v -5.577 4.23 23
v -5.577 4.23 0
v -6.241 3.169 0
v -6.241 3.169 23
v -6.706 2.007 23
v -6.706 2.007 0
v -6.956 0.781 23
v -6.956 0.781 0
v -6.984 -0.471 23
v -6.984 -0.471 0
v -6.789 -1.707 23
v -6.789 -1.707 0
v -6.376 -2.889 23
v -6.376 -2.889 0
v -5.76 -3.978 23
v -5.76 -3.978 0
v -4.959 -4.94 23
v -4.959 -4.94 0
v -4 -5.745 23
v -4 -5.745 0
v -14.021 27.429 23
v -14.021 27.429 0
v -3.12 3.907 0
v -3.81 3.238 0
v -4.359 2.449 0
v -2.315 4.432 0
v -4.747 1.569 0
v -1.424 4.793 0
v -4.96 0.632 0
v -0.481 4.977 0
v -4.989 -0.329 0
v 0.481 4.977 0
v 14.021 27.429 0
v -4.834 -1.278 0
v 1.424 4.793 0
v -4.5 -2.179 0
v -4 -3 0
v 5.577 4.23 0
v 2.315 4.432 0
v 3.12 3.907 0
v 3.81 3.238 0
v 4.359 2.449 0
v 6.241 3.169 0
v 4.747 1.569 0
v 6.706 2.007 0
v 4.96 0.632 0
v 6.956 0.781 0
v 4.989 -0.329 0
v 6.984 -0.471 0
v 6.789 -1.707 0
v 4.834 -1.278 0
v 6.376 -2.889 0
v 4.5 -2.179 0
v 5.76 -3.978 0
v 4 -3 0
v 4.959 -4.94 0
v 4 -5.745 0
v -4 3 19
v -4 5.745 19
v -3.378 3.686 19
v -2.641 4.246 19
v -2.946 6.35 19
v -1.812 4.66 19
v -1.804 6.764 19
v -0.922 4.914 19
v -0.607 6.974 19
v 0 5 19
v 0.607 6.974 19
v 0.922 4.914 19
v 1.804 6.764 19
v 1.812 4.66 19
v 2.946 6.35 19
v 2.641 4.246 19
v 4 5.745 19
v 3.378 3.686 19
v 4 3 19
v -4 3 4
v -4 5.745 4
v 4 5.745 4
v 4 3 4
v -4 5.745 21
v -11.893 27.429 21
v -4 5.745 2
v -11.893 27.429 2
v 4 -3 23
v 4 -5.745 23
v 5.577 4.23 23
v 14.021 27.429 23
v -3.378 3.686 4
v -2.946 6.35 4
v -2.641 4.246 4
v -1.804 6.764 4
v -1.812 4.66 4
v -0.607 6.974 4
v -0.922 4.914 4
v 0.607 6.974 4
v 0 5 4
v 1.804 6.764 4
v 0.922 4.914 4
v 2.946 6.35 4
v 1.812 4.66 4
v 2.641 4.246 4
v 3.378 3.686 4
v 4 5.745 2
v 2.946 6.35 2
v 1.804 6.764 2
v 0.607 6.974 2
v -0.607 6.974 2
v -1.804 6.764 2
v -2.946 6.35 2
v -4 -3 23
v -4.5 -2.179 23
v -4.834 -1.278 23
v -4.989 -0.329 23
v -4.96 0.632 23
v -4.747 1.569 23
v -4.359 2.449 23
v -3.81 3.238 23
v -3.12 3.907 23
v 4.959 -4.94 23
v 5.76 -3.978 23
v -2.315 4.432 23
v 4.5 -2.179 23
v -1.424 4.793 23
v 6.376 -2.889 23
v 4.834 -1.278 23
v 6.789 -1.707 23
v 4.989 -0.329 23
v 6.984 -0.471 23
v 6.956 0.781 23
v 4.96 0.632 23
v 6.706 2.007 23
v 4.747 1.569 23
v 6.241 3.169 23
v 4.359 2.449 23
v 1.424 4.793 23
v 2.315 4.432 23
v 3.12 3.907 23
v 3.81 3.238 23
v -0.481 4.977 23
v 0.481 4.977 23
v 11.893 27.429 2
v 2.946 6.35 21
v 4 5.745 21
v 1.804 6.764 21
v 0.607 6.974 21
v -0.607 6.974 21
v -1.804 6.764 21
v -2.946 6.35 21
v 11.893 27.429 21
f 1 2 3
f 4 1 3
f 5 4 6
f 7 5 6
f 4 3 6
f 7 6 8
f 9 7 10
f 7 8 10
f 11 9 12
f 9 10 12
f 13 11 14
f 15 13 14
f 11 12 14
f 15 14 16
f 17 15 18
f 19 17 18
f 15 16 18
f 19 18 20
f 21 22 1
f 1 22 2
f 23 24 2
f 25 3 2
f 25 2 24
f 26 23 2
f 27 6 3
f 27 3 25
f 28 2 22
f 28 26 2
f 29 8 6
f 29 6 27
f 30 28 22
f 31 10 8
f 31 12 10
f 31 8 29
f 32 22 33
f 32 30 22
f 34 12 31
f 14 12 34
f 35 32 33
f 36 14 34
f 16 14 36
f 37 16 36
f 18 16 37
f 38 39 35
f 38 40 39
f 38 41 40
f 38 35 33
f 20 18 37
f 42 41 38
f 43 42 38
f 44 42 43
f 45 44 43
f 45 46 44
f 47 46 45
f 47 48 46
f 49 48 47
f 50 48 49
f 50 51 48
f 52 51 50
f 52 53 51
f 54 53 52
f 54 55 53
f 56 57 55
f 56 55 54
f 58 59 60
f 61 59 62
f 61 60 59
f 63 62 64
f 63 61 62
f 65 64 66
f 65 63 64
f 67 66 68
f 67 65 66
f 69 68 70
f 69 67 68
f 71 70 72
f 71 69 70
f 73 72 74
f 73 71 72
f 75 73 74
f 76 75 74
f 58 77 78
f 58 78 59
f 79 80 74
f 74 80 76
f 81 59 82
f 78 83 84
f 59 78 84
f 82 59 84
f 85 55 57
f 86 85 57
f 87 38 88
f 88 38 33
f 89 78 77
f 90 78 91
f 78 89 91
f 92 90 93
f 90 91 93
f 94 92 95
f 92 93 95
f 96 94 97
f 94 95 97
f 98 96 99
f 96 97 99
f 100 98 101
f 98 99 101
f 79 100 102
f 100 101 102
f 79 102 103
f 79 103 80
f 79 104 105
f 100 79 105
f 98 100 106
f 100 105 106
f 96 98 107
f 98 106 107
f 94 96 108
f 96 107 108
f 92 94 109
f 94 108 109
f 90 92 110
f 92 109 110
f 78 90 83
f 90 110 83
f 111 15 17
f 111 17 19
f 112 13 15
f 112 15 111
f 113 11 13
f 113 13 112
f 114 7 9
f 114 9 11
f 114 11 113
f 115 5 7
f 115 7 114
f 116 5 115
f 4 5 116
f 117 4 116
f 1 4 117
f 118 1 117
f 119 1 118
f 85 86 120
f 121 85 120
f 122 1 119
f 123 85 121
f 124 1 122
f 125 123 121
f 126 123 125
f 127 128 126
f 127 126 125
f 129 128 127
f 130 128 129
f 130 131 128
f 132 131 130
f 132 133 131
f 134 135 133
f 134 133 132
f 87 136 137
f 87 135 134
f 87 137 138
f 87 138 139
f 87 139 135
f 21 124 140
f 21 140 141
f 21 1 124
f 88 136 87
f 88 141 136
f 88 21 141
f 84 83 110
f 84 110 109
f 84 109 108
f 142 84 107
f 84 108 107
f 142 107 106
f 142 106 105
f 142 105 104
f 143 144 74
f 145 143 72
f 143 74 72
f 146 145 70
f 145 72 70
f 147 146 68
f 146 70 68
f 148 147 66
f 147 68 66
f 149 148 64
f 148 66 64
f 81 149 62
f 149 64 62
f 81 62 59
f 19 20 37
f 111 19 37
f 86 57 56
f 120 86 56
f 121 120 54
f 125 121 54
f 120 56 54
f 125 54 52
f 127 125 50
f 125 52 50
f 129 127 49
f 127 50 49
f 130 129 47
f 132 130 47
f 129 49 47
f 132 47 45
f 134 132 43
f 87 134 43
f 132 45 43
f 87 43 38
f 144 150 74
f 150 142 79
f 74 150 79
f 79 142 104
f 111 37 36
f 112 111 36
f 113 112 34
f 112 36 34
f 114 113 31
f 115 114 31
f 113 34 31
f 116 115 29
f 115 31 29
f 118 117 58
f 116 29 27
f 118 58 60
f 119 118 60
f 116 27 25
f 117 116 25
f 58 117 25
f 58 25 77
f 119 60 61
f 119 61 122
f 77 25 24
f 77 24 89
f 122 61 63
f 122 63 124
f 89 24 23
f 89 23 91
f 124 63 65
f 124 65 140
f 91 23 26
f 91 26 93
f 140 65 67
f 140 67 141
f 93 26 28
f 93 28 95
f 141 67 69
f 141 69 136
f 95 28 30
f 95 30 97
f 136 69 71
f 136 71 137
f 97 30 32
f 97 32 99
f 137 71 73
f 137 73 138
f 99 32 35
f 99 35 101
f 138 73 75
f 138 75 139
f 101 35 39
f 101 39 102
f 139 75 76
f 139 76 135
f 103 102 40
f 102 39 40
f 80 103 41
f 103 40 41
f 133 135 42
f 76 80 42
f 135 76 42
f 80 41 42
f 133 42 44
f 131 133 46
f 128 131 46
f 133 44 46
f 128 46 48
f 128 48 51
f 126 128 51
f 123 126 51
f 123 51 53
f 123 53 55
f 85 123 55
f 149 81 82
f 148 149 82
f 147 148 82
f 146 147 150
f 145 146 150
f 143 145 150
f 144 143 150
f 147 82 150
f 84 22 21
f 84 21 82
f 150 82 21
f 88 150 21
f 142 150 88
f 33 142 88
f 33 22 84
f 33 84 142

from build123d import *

# Parameters (mm, degrees)
F1_DEPTH = 23
F3_DEPTH = 2
F5_DEPTH = 2
F6_W     = 8
F6_H     = 15
F7_DEPTH = 25


with BuildPart() as f1:
    # F0 (on Top) → F1 (new body)
    with BuildSketch(Plane.XY):
        with BuildLine():
            Line((-14.0209387689, 27.4292568356), (-5.5771887097, 4.2302442124))
            ThreePointArc((-5.5771887097, 4.2302442124), (-4.8480847739, 5.0493637247), (-4, 5.7445626465))
            Line((-4, 5.7445626465), (-11.892583224, 27.4292568356))
            Line((-11.892583224, 27.4292568356), (-14.0209387689, 27.4292568356))
        make_face()
        with BuildLine():
            ThreePointArc((-4, -3), (0, 5), (4, -3))
            Line((4, -3), (4, -5.7445626465))
            ThreePointArc((4, -5.7445626465), (6.9141036197, -1.0932388287), (5.5771887097, 4.2302442124))
            ThreePointArc((5.5771887097, 4.2302442124), (4.8480847739, 5.0493637247), (4, 5.7445626465))
            ThreePointArc((4, 5.7445626465), (0, 7), (-4, 5.7445626465))
            ThreePointArc((-4, 5.7445626465), (-4.8480847739, 5.0493637247), (-5.5771887097, 4.2302442124))
            ThreePointArc((-5.5771887097, 4.2302442124), (-6.9141036197, -1.0932388287), (-4, -5.7445626465))
            Line((-4, -5.7445626465), (-4, -3))
        make_face()
        with BuildLine():
            ThreePointArc((4, 5.7445626465), (4.8480847739, 5.0493637247), (5.5771887097, 4.2302442124))
            Line((5.5771887097, 4.2302442124), (14.0209387689, 27.4292568356))
            Line((14.0209387689, 27.4292568356), (11.892583224, 27.4292568356))
            Line((11.892583224, 27.4292568356), (4, 5.7445626465))
        make_face()
    extrude(amount=F1_DEPTH)

    # F2 (on face) → F3 (join)
    with BuildSketch(Plane.XY.offset(23)):
        with BuildLine():
            Line((11.892583224, 27.4292568356), (-11.892583224, 27.4292568356))
            Line((-11.892583224, 27.4292568356), (-4, 5.7445626465))
            ThreePointArc((-4, 5.7445626465), (0, 7), (4, 5.7445626465))
            Line((4, 5.7445626465), (11.892583224, 27.4292568356))
        make_face()
    extrude(amount=-F3_DEPTH)

    # F4 (on face) → F5 (join)
    with BuildSketch(Plane(origin=(0, 0, 0), x_dir=(1, 0, 0), z_dir=(0, 0, -1))):
        with BuildLine():
            Line((-11.892583224, -27.4292568356), (11.892583224, -27.4292568356))
            Line((11.892583224, -27.4292568356), (4, -5.7445626465))
            ThreePointArc((4, -5.7445626465), (0, -7), (-4, -5.7445626465))
            Line((-4, -5.7445626465), (-11.892583224, -27.4292568356))
        make_face()
    extrude(amount=-F5_DEPTH)

    # F6 (on Front) → F7 (cut)
    with BuildSketch(Plane.XZ):
        with Locations((0, 11.5)):
            Rectangle(F6_W, F6_H)
    extrude(amount=-F7_DEPTH, mode=Mode.SUBTRACT)


solid = f1.part
